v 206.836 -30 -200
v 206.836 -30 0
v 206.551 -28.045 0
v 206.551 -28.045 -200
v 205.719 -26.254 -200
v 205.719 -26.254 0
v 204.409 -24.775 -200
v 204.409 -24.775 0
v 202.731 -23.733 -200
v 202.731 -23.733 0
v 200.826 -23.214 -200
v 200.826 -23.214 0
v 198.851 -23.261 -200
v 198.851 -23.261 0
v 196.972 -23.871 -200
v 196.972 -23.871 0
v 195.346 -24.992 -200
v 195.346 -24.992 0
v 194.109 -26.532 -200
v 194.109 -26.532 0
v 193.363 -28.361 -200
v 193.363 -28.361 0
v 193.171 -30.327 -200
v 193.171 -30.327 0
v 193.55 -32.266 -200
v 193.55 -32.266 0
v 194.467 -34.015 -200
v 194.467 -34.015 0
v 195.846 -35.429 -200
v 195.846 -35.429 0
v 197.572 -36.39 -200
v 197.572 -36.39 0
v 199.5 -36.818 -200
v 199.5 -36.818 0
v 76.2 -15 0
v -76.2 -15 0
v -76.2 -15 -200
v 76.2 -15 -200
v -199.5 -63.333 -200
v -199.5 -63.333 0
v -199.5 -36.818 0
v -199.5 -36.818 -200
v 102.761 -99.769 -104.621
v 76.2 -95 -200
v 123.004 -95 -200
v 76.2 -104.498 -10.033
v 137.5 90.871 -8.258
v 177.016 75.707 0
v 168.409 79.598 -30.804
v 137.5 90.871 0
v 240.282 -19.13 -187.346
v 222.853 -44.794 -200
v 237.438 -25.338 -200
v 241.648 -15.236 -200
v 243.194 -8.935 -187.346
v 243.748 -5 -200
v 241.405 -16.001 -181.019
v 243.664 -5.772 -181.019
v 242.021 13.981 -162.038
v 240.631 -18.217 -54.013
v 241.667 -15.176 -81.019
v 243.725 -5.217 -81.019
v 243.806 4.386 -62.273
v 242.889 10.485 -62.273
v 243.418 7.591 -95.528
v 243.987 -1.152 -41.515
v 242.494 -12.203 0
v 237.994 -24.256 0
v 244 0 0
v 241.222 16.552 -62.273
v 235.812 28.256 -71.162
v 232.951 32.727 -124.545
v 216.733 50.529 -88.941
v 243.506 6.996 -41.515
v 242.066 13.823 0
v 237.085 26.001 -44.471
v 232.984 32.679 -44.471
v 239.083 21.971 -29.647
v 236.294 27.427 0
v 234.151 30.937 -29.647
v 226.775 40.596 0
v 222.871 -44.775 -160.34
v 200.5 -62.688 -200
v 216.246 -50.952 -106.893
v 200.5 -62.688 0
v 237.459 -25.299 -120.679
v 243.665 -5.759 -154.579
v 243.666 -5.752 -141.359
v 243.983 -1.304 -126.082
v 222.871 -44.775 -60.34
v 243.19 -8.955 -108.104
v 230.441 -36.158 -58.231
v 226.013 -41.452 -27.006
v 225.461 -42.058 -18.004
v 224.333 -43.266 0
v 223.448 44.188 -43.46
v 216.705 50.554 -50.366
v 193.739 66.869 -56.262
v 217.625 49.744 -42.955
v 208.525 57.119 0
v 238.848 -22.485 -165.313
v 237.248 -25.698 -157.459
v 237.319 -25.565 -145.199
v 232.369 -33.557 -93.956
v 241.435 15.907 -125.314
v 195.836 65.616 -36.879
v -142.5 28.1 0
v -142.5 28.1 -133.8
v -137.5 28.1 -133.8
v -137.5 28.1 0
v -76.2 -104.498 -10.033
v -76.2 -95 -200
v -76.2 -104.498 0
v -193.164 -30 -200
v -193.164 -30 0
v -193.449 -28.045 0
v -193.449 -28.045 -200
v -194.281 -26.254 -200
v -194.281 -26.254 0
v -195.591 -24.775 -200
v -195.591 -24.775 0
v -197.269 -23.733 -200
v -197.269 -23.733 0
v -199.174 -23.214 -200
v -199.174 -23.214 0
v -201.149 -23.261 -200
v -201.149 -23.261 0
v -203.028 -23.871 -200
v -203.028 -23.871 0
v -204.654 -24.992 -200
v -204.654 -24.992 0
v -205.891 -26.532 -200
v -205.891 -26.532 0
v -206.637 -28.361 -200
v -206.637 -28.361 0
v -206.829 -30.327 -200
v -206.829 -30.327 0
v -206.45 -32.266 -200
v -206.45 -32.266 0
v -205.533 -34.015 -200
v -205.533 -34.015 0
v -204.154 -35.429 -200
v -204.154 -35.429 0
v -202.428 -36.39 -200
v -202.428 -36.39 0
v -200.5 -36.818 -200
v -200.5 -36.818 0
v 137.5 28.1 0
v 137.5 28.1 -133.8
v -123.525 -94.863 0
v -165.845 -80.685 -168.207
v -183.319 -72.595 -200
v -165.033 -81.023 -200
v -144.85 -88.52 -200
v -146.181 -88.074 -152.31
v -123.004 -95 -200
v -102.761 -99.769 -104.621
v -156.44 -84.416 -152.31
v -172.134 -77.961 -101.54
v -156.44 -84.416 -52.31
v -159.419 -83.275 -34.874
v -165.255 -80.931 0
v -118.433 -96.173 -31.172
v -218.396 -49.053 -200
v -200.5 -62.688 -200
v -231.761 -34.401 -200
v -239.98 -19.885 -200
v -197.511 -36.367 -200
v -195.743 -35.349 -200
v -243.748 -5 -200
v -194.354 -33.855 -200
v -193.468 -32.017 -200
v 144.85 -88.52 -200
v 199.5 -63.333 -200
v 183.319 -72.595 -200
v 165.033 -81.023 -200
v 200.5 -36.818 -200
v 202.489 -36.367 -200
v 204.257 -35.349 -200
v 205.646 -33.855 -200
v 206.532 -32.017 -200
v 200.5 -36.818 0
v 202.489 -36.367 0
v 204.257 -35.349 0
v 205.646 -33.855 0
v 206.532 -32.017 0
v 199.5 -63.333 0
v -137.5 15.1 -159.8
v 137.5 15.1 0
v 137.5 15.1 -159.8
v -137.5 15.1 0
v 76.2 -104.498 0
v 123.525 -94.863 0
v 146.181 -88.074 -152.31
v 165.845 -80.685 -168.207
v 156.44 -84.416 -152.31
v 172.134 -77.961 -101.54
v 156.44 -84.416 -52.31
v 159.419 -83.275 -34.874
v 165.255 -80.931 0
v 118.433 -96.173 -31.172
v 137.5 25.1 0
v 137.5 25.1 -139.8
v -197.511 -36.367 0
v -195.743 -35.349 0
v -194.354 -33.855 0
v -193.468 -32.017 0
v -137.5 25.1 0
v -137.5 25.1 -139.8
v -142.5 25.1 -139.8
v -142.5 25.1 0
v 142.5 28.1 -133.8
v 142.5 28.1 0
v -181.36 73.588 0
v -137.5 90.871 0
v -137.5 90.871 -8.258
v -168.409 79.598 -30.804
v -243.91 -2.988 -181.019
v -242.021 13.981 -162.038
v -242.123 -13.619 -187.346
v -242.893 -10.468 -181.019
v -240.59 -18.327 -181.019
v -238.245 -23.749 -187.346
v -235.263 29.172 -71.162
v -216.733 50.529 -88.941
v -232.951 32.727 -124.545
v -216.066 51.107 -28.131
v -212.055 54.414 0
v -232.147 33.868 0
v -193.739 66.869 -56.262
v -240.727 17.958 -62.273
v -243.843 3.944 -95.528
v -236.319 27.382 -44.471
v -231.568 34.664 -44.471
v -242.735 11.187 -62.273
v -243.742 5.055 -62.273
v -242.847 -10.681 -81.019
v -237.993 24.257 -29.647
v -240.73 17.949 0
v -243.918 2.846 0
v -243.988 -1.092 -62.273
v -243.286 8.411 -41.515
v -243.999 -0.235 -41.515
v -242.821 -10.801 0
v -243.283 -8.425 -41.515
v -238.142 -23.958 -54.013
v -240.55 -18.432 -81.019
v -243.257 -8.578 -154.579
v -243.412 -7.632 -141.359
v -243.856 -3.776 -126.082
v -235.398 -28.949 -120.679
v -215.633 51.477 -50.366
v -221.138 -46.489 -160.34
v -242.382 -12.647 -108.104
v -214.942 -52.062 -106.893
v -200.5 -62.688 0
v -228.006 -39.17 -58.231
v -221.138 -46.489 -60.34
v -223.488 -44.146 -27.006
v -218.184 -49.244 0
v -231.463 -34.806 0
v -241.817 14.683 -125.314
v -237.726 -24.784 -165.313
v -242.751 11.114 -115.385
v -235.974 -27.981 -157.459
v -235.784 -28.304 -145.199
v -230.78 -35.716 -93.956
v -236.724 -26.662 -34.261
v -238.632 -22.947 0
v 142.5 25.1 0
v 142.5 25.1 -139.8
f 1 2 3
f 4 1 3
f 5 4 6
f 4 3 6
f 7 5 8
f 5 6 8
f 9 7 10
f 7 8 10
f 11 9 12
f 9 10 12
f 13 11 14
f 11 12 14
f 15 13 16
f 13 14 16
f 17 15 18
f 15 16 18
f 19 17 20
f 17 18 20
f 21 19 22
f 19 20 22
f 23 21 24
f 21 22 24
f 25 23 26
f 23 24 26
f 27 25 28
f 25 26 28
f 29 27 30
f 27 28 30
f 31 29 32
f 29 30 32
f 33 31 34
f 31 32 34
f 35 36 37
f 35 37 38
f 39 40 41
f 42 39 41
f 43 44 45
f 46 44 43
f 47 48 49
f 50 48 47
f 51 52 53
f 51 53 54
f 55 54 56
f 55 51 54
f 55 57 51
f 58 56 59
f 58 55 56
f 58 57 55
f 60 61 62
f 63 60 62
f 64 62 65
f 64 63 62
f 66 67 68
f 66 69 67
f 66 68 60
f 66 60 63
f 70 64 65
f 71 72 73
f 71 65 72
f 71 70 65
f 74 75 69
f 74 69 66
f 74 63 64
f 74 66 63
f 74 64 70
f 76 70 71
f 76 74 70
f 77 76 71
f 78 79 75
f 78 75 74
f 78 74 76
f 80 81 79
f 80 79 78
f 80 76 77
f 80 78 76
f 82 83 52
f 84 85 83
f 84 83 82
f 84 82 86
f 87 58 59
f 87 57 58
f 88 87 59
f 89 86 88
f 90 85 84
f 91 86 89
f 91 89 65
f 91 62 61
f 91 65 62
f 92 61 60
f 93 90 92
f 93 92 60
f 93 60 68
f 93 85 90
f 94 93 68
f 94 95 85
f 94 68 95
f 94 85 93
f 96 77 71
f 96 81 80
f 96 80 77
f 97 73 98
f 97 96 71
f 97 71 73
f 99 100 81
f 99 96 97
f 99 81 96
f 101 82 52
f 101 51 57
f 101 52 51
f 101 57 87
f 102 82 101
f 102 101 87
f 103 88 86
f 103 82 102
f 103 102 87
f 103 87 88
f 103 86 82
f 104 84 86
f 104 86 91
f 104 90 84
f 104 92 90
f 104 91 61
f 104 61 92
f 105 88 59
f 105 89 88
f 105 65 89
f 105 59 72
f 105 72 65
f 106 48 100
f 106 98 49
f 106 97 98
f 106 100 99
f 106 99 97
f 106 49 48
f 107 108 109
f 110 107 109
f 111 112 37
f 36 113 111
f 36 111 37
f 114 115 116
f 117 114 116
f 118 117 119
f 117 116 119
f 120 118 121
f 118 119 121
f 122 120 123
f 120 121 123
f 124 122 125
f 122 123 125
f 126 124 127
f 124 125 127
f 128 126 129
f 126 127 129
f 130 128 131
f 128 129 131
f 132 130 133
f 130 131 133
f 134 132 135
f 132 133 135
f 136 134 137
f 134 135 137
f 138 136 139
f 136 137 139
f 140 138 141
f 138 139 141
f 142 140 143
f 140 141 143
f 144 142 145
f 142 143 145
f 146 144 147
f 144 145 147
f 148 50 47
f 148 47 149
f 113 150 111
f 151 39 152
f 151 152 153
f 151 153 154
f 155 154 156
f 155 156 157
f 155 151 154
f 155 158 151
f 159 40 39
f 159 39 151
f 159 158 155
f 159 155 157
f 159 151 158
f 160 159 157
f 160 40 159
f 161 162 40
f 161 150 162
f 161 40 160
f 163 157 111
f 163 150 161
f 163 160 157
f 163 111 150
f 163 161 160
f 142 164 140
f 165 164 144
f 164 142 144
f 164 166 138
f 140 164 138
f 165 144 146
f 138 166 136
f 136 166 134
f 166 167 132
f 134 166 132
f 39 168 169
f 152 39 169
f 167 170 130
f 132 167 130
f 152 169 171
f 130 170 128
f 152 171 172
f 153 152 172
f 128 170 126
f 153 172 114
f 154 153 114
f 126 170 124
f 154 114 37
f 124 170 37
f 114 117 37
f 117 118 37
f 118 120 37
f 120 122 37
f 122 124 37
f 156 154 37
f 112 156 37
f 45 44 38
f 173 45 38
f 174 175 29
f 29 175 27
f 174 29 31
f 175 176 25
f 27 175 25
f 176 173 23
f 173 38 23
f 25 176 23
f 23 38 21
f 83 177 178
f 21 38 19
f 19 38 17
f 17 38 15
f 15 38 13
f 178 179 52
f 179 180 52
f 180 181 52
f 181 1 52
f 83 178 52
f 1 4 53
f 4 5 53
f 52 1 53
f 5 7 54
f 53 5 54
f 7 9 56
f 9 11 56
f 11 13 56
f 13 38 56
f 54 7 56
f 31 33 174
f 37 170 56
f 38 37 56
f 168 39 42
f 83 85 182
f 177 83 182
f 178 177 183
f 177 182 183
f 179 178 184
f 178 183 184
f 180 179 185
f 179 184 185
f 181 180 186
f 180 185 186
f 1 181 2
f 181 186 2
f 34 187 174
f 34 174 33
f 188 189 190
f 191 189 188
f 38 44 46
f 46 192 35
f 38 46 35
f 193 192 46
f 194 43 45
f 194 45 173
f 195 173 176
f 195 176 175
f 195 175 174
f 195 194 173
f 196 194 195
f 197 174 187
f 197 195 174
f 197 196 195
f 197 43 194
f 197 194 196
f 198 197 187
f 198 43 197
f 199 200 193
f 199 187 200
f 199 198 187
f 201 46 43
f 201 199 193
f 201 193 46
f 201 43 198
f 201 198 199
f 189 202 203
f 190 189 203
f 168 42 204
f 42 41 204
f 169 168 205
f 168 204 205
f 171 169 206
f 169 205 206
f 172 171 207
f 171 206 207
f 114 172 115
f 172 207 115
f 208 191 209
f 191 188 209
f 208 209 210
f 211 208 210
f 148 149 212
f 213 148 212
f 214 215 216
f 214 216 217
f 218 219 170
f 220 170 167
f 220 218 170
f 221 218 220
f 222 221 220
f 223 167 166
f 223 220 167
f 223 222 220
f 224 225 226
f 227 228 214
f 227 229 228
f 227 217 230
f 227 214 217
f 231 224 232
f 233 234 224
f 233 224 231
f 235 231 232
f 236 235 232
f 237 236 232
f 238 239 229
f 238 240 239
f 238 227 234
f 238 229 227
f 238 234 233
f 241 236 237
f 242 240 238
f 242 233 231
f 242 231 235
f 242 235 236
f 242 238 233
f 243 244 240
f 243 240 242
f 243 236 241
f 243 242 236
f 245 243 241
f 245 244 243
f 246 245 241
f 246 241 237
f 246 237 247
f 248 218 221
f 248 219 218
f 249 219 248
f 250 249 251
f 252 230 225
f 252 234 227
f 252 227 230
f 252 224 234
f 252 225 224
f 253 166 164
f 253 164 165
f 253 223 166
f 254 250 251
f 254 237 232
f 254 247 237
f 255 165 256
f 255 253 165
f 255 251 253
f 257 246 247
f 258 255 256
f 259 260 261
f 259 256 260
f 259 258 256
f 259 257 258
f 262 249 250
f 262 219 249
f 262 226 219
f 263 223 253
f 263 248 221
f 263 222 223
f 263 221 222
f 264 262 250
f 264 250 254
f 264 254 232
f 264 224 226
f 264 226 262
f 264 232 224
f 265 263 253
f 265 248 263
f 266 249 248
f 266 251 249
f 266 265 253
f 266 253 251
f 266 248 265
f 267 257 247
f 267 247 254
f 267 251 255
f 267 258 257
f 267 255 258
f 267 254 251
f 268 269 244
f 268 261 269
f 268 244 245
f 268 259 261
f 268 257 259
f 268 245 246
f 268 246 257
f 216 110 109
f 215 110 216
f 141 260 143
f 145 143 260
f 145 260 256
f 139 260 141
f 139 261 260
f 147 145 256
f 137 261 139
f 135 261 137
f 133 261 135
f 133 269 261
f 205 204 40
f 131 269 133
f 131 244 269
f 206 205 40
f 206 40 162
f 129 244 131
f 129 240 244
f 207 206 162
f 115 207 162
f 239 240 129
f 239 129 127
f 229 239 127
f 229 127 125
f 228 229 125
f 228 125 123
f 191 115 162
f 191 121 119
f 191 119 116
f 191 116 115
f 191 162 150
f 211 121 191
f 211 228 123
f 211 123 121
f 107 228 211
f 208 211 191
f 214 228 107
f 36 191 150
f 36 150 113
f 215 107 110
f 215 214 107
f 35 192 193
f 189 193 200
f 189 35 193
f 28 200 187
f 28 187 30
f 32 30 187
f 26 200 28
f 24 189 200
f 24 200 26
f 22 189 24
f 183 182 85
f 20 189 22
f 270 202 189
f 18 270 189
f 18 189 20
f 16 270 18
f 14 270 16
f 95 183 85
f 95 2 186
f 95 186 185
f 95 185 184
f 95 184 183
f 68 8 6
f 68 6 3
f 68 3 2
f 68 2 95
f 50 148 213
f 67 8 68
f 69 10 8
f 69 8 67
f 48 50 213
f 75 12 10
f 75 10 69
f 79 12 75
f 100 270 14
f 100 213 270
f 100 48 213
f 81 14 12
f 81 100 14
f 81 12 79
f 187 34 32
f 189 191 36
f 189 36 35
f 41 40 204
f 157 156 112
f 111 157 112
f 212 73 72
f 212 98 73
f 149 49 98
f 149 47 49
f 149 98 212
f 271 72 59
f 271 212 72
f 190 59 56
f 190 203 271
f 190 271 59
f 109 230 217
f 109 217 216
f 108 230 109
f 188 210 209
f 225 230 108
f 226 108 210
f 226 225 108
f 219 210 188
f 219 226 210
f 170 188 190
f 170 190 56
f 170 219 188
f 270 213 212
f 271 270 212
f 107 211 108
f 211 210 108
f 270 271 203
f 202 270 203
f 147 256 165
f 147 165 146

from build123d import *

# Parameters (mm, degrees)
SKETCH1_RX               = 244
SKETCH1_RY               = 110
BOSS_EXTRUDE1_DEPTH      = 200
SKETCH12_R               = 6.83635542
CUT_EXTRUDE8_DEPTH       = 201
CUT_EXTRUDE10_DEPTH      = 245
CUT_EXTRUDE10_DEPTH_BACK = 245
CUT_EXTRUDE11_DEPTH      = 1.0000001
CUT_EXTRUDE11_DEPTH_BACK = 201.0000001
SKETCH17_W               = 152.4
SKETCH17_H               = 90
CUT_EXTRUDE12_DEPTH      = 1.0000001
CUT_EXTRUDE12_DEPTH_BACK = 201.0000001
SKETCH18_W               = 1
SKETCH18_H               = 33.332943991
CUT_EXTRUDE13_DEPTH      = 1.0000001
CUT_EXTRUDE13_DEPTH_BACK = 201.0000001


with BuildPart() as part:
    # Sketch1 → Boss-Extrude1 (new body)
    with BuildSketch(Plane.XY):
        with Locations((0, 0)):
            Ellipse(SKETCH1_RX, SKETCH1_RY)
    extrude(amount=-BOSS_EXTRUDE1_DEPTH)

    # Sketch12 → Cut-Extrude8 (cut, through all)
    with BuildSketch(Plane.XY):
        with Locations((200, -30)):
            Circle(SKETCH12_R)
        with Locations((-200, -30)):
            Circle(SKETCH12_R)
    extrude(amount=-CUT_EXTRUDE8_DEPTH, mode=Mode.SUBTRACT)

    # Sketch15 → Cut-Extrude10 (cut, two sides)
    with BuildSketch(Plane(origin=(0, 0, 0), x_dir=(0, 0, -1), z_dir=(1, 0, 0))) as cut_extrude10_sk:
        Polygon((0, 110), (0, 95), (200, -5), (200, 110), align=None)
        Polygon((0, -110), (200, -110), (200, -95), (0, -105), align=None)
    extrude(amount=CUT_EXTRUDE10_DEPTH, mode=Mode.SUBTRACT)
    extrude(cut_extrude10_sk.sketch, amount=-CUT_EXTRUDE10_DEPTH_BACK, mode=Mode.SUBTRACT)

    # Sketch16 → Cut-Extrude11 (cut, two sides)
    with BuildSketch(Plane.XY) as cut_extrude11_sk:
        Polygon((-137.5, 95), (137.5, 95), (137.5, 28.1), (142.5, 28.1), (142.5, 25.1), (137.5, 25.1), (137.5, 15.1), (-137.5, 15.1), (-137.5, 25.1), (-142.5, 25.1), (-142.5, 28.1), (-137.5, 28.1), align=None)
    extrude(amount=CUT_EXTRUDE11_DEPTH, mode=Mode.SUBTRACT)
    extrude(cut_extrude11_sk.sketch, amount=-CUT_EXTRUDE11_DEPTH_BACK, mode=Mode.SUBTRACT)

    # Sketch17 → Cut-Extrude12 (cut, two sides)
    with BuildSketch(Plane.XY) as cut_extrude12_sk:
        with Locations((0, -60)):
            Rectangle(SKETCH17_W, SKETCH17_H)
    extrude(amount=CUT_EXTRUDE12_DEPTH, mode=Mode.SUBTRACT)
    extrude(cut_extrude12_sk.sketch, amount=-CUT_EXTRUDE12_DEPTH_BACK, mode=Mode.SUBTRACT)

    # Sketch18 → Cut-Extrude13 (cut, two sides)
    with BuildSketch(Plane.XY) as cut_extrude13_sk:
        with Locations((200, -46.666471996)):
            Rectangle(SKETCH18_W, SKETCH18_H)
        with Locations((-200, -46.666471996)):
            Rectangle(SKETCH18_W, SKETCH18_H)
    extrude(amount=CUT_EXTRUDE13_DEPTH, mode=Mode.SUBTRACT)
    extrude(cut_extrude13_sk.sketch, amount=-CUT_EXTRUDE13_DEPTH_BACK, mode=Mode.SUBTRACT)


solid = part.part
